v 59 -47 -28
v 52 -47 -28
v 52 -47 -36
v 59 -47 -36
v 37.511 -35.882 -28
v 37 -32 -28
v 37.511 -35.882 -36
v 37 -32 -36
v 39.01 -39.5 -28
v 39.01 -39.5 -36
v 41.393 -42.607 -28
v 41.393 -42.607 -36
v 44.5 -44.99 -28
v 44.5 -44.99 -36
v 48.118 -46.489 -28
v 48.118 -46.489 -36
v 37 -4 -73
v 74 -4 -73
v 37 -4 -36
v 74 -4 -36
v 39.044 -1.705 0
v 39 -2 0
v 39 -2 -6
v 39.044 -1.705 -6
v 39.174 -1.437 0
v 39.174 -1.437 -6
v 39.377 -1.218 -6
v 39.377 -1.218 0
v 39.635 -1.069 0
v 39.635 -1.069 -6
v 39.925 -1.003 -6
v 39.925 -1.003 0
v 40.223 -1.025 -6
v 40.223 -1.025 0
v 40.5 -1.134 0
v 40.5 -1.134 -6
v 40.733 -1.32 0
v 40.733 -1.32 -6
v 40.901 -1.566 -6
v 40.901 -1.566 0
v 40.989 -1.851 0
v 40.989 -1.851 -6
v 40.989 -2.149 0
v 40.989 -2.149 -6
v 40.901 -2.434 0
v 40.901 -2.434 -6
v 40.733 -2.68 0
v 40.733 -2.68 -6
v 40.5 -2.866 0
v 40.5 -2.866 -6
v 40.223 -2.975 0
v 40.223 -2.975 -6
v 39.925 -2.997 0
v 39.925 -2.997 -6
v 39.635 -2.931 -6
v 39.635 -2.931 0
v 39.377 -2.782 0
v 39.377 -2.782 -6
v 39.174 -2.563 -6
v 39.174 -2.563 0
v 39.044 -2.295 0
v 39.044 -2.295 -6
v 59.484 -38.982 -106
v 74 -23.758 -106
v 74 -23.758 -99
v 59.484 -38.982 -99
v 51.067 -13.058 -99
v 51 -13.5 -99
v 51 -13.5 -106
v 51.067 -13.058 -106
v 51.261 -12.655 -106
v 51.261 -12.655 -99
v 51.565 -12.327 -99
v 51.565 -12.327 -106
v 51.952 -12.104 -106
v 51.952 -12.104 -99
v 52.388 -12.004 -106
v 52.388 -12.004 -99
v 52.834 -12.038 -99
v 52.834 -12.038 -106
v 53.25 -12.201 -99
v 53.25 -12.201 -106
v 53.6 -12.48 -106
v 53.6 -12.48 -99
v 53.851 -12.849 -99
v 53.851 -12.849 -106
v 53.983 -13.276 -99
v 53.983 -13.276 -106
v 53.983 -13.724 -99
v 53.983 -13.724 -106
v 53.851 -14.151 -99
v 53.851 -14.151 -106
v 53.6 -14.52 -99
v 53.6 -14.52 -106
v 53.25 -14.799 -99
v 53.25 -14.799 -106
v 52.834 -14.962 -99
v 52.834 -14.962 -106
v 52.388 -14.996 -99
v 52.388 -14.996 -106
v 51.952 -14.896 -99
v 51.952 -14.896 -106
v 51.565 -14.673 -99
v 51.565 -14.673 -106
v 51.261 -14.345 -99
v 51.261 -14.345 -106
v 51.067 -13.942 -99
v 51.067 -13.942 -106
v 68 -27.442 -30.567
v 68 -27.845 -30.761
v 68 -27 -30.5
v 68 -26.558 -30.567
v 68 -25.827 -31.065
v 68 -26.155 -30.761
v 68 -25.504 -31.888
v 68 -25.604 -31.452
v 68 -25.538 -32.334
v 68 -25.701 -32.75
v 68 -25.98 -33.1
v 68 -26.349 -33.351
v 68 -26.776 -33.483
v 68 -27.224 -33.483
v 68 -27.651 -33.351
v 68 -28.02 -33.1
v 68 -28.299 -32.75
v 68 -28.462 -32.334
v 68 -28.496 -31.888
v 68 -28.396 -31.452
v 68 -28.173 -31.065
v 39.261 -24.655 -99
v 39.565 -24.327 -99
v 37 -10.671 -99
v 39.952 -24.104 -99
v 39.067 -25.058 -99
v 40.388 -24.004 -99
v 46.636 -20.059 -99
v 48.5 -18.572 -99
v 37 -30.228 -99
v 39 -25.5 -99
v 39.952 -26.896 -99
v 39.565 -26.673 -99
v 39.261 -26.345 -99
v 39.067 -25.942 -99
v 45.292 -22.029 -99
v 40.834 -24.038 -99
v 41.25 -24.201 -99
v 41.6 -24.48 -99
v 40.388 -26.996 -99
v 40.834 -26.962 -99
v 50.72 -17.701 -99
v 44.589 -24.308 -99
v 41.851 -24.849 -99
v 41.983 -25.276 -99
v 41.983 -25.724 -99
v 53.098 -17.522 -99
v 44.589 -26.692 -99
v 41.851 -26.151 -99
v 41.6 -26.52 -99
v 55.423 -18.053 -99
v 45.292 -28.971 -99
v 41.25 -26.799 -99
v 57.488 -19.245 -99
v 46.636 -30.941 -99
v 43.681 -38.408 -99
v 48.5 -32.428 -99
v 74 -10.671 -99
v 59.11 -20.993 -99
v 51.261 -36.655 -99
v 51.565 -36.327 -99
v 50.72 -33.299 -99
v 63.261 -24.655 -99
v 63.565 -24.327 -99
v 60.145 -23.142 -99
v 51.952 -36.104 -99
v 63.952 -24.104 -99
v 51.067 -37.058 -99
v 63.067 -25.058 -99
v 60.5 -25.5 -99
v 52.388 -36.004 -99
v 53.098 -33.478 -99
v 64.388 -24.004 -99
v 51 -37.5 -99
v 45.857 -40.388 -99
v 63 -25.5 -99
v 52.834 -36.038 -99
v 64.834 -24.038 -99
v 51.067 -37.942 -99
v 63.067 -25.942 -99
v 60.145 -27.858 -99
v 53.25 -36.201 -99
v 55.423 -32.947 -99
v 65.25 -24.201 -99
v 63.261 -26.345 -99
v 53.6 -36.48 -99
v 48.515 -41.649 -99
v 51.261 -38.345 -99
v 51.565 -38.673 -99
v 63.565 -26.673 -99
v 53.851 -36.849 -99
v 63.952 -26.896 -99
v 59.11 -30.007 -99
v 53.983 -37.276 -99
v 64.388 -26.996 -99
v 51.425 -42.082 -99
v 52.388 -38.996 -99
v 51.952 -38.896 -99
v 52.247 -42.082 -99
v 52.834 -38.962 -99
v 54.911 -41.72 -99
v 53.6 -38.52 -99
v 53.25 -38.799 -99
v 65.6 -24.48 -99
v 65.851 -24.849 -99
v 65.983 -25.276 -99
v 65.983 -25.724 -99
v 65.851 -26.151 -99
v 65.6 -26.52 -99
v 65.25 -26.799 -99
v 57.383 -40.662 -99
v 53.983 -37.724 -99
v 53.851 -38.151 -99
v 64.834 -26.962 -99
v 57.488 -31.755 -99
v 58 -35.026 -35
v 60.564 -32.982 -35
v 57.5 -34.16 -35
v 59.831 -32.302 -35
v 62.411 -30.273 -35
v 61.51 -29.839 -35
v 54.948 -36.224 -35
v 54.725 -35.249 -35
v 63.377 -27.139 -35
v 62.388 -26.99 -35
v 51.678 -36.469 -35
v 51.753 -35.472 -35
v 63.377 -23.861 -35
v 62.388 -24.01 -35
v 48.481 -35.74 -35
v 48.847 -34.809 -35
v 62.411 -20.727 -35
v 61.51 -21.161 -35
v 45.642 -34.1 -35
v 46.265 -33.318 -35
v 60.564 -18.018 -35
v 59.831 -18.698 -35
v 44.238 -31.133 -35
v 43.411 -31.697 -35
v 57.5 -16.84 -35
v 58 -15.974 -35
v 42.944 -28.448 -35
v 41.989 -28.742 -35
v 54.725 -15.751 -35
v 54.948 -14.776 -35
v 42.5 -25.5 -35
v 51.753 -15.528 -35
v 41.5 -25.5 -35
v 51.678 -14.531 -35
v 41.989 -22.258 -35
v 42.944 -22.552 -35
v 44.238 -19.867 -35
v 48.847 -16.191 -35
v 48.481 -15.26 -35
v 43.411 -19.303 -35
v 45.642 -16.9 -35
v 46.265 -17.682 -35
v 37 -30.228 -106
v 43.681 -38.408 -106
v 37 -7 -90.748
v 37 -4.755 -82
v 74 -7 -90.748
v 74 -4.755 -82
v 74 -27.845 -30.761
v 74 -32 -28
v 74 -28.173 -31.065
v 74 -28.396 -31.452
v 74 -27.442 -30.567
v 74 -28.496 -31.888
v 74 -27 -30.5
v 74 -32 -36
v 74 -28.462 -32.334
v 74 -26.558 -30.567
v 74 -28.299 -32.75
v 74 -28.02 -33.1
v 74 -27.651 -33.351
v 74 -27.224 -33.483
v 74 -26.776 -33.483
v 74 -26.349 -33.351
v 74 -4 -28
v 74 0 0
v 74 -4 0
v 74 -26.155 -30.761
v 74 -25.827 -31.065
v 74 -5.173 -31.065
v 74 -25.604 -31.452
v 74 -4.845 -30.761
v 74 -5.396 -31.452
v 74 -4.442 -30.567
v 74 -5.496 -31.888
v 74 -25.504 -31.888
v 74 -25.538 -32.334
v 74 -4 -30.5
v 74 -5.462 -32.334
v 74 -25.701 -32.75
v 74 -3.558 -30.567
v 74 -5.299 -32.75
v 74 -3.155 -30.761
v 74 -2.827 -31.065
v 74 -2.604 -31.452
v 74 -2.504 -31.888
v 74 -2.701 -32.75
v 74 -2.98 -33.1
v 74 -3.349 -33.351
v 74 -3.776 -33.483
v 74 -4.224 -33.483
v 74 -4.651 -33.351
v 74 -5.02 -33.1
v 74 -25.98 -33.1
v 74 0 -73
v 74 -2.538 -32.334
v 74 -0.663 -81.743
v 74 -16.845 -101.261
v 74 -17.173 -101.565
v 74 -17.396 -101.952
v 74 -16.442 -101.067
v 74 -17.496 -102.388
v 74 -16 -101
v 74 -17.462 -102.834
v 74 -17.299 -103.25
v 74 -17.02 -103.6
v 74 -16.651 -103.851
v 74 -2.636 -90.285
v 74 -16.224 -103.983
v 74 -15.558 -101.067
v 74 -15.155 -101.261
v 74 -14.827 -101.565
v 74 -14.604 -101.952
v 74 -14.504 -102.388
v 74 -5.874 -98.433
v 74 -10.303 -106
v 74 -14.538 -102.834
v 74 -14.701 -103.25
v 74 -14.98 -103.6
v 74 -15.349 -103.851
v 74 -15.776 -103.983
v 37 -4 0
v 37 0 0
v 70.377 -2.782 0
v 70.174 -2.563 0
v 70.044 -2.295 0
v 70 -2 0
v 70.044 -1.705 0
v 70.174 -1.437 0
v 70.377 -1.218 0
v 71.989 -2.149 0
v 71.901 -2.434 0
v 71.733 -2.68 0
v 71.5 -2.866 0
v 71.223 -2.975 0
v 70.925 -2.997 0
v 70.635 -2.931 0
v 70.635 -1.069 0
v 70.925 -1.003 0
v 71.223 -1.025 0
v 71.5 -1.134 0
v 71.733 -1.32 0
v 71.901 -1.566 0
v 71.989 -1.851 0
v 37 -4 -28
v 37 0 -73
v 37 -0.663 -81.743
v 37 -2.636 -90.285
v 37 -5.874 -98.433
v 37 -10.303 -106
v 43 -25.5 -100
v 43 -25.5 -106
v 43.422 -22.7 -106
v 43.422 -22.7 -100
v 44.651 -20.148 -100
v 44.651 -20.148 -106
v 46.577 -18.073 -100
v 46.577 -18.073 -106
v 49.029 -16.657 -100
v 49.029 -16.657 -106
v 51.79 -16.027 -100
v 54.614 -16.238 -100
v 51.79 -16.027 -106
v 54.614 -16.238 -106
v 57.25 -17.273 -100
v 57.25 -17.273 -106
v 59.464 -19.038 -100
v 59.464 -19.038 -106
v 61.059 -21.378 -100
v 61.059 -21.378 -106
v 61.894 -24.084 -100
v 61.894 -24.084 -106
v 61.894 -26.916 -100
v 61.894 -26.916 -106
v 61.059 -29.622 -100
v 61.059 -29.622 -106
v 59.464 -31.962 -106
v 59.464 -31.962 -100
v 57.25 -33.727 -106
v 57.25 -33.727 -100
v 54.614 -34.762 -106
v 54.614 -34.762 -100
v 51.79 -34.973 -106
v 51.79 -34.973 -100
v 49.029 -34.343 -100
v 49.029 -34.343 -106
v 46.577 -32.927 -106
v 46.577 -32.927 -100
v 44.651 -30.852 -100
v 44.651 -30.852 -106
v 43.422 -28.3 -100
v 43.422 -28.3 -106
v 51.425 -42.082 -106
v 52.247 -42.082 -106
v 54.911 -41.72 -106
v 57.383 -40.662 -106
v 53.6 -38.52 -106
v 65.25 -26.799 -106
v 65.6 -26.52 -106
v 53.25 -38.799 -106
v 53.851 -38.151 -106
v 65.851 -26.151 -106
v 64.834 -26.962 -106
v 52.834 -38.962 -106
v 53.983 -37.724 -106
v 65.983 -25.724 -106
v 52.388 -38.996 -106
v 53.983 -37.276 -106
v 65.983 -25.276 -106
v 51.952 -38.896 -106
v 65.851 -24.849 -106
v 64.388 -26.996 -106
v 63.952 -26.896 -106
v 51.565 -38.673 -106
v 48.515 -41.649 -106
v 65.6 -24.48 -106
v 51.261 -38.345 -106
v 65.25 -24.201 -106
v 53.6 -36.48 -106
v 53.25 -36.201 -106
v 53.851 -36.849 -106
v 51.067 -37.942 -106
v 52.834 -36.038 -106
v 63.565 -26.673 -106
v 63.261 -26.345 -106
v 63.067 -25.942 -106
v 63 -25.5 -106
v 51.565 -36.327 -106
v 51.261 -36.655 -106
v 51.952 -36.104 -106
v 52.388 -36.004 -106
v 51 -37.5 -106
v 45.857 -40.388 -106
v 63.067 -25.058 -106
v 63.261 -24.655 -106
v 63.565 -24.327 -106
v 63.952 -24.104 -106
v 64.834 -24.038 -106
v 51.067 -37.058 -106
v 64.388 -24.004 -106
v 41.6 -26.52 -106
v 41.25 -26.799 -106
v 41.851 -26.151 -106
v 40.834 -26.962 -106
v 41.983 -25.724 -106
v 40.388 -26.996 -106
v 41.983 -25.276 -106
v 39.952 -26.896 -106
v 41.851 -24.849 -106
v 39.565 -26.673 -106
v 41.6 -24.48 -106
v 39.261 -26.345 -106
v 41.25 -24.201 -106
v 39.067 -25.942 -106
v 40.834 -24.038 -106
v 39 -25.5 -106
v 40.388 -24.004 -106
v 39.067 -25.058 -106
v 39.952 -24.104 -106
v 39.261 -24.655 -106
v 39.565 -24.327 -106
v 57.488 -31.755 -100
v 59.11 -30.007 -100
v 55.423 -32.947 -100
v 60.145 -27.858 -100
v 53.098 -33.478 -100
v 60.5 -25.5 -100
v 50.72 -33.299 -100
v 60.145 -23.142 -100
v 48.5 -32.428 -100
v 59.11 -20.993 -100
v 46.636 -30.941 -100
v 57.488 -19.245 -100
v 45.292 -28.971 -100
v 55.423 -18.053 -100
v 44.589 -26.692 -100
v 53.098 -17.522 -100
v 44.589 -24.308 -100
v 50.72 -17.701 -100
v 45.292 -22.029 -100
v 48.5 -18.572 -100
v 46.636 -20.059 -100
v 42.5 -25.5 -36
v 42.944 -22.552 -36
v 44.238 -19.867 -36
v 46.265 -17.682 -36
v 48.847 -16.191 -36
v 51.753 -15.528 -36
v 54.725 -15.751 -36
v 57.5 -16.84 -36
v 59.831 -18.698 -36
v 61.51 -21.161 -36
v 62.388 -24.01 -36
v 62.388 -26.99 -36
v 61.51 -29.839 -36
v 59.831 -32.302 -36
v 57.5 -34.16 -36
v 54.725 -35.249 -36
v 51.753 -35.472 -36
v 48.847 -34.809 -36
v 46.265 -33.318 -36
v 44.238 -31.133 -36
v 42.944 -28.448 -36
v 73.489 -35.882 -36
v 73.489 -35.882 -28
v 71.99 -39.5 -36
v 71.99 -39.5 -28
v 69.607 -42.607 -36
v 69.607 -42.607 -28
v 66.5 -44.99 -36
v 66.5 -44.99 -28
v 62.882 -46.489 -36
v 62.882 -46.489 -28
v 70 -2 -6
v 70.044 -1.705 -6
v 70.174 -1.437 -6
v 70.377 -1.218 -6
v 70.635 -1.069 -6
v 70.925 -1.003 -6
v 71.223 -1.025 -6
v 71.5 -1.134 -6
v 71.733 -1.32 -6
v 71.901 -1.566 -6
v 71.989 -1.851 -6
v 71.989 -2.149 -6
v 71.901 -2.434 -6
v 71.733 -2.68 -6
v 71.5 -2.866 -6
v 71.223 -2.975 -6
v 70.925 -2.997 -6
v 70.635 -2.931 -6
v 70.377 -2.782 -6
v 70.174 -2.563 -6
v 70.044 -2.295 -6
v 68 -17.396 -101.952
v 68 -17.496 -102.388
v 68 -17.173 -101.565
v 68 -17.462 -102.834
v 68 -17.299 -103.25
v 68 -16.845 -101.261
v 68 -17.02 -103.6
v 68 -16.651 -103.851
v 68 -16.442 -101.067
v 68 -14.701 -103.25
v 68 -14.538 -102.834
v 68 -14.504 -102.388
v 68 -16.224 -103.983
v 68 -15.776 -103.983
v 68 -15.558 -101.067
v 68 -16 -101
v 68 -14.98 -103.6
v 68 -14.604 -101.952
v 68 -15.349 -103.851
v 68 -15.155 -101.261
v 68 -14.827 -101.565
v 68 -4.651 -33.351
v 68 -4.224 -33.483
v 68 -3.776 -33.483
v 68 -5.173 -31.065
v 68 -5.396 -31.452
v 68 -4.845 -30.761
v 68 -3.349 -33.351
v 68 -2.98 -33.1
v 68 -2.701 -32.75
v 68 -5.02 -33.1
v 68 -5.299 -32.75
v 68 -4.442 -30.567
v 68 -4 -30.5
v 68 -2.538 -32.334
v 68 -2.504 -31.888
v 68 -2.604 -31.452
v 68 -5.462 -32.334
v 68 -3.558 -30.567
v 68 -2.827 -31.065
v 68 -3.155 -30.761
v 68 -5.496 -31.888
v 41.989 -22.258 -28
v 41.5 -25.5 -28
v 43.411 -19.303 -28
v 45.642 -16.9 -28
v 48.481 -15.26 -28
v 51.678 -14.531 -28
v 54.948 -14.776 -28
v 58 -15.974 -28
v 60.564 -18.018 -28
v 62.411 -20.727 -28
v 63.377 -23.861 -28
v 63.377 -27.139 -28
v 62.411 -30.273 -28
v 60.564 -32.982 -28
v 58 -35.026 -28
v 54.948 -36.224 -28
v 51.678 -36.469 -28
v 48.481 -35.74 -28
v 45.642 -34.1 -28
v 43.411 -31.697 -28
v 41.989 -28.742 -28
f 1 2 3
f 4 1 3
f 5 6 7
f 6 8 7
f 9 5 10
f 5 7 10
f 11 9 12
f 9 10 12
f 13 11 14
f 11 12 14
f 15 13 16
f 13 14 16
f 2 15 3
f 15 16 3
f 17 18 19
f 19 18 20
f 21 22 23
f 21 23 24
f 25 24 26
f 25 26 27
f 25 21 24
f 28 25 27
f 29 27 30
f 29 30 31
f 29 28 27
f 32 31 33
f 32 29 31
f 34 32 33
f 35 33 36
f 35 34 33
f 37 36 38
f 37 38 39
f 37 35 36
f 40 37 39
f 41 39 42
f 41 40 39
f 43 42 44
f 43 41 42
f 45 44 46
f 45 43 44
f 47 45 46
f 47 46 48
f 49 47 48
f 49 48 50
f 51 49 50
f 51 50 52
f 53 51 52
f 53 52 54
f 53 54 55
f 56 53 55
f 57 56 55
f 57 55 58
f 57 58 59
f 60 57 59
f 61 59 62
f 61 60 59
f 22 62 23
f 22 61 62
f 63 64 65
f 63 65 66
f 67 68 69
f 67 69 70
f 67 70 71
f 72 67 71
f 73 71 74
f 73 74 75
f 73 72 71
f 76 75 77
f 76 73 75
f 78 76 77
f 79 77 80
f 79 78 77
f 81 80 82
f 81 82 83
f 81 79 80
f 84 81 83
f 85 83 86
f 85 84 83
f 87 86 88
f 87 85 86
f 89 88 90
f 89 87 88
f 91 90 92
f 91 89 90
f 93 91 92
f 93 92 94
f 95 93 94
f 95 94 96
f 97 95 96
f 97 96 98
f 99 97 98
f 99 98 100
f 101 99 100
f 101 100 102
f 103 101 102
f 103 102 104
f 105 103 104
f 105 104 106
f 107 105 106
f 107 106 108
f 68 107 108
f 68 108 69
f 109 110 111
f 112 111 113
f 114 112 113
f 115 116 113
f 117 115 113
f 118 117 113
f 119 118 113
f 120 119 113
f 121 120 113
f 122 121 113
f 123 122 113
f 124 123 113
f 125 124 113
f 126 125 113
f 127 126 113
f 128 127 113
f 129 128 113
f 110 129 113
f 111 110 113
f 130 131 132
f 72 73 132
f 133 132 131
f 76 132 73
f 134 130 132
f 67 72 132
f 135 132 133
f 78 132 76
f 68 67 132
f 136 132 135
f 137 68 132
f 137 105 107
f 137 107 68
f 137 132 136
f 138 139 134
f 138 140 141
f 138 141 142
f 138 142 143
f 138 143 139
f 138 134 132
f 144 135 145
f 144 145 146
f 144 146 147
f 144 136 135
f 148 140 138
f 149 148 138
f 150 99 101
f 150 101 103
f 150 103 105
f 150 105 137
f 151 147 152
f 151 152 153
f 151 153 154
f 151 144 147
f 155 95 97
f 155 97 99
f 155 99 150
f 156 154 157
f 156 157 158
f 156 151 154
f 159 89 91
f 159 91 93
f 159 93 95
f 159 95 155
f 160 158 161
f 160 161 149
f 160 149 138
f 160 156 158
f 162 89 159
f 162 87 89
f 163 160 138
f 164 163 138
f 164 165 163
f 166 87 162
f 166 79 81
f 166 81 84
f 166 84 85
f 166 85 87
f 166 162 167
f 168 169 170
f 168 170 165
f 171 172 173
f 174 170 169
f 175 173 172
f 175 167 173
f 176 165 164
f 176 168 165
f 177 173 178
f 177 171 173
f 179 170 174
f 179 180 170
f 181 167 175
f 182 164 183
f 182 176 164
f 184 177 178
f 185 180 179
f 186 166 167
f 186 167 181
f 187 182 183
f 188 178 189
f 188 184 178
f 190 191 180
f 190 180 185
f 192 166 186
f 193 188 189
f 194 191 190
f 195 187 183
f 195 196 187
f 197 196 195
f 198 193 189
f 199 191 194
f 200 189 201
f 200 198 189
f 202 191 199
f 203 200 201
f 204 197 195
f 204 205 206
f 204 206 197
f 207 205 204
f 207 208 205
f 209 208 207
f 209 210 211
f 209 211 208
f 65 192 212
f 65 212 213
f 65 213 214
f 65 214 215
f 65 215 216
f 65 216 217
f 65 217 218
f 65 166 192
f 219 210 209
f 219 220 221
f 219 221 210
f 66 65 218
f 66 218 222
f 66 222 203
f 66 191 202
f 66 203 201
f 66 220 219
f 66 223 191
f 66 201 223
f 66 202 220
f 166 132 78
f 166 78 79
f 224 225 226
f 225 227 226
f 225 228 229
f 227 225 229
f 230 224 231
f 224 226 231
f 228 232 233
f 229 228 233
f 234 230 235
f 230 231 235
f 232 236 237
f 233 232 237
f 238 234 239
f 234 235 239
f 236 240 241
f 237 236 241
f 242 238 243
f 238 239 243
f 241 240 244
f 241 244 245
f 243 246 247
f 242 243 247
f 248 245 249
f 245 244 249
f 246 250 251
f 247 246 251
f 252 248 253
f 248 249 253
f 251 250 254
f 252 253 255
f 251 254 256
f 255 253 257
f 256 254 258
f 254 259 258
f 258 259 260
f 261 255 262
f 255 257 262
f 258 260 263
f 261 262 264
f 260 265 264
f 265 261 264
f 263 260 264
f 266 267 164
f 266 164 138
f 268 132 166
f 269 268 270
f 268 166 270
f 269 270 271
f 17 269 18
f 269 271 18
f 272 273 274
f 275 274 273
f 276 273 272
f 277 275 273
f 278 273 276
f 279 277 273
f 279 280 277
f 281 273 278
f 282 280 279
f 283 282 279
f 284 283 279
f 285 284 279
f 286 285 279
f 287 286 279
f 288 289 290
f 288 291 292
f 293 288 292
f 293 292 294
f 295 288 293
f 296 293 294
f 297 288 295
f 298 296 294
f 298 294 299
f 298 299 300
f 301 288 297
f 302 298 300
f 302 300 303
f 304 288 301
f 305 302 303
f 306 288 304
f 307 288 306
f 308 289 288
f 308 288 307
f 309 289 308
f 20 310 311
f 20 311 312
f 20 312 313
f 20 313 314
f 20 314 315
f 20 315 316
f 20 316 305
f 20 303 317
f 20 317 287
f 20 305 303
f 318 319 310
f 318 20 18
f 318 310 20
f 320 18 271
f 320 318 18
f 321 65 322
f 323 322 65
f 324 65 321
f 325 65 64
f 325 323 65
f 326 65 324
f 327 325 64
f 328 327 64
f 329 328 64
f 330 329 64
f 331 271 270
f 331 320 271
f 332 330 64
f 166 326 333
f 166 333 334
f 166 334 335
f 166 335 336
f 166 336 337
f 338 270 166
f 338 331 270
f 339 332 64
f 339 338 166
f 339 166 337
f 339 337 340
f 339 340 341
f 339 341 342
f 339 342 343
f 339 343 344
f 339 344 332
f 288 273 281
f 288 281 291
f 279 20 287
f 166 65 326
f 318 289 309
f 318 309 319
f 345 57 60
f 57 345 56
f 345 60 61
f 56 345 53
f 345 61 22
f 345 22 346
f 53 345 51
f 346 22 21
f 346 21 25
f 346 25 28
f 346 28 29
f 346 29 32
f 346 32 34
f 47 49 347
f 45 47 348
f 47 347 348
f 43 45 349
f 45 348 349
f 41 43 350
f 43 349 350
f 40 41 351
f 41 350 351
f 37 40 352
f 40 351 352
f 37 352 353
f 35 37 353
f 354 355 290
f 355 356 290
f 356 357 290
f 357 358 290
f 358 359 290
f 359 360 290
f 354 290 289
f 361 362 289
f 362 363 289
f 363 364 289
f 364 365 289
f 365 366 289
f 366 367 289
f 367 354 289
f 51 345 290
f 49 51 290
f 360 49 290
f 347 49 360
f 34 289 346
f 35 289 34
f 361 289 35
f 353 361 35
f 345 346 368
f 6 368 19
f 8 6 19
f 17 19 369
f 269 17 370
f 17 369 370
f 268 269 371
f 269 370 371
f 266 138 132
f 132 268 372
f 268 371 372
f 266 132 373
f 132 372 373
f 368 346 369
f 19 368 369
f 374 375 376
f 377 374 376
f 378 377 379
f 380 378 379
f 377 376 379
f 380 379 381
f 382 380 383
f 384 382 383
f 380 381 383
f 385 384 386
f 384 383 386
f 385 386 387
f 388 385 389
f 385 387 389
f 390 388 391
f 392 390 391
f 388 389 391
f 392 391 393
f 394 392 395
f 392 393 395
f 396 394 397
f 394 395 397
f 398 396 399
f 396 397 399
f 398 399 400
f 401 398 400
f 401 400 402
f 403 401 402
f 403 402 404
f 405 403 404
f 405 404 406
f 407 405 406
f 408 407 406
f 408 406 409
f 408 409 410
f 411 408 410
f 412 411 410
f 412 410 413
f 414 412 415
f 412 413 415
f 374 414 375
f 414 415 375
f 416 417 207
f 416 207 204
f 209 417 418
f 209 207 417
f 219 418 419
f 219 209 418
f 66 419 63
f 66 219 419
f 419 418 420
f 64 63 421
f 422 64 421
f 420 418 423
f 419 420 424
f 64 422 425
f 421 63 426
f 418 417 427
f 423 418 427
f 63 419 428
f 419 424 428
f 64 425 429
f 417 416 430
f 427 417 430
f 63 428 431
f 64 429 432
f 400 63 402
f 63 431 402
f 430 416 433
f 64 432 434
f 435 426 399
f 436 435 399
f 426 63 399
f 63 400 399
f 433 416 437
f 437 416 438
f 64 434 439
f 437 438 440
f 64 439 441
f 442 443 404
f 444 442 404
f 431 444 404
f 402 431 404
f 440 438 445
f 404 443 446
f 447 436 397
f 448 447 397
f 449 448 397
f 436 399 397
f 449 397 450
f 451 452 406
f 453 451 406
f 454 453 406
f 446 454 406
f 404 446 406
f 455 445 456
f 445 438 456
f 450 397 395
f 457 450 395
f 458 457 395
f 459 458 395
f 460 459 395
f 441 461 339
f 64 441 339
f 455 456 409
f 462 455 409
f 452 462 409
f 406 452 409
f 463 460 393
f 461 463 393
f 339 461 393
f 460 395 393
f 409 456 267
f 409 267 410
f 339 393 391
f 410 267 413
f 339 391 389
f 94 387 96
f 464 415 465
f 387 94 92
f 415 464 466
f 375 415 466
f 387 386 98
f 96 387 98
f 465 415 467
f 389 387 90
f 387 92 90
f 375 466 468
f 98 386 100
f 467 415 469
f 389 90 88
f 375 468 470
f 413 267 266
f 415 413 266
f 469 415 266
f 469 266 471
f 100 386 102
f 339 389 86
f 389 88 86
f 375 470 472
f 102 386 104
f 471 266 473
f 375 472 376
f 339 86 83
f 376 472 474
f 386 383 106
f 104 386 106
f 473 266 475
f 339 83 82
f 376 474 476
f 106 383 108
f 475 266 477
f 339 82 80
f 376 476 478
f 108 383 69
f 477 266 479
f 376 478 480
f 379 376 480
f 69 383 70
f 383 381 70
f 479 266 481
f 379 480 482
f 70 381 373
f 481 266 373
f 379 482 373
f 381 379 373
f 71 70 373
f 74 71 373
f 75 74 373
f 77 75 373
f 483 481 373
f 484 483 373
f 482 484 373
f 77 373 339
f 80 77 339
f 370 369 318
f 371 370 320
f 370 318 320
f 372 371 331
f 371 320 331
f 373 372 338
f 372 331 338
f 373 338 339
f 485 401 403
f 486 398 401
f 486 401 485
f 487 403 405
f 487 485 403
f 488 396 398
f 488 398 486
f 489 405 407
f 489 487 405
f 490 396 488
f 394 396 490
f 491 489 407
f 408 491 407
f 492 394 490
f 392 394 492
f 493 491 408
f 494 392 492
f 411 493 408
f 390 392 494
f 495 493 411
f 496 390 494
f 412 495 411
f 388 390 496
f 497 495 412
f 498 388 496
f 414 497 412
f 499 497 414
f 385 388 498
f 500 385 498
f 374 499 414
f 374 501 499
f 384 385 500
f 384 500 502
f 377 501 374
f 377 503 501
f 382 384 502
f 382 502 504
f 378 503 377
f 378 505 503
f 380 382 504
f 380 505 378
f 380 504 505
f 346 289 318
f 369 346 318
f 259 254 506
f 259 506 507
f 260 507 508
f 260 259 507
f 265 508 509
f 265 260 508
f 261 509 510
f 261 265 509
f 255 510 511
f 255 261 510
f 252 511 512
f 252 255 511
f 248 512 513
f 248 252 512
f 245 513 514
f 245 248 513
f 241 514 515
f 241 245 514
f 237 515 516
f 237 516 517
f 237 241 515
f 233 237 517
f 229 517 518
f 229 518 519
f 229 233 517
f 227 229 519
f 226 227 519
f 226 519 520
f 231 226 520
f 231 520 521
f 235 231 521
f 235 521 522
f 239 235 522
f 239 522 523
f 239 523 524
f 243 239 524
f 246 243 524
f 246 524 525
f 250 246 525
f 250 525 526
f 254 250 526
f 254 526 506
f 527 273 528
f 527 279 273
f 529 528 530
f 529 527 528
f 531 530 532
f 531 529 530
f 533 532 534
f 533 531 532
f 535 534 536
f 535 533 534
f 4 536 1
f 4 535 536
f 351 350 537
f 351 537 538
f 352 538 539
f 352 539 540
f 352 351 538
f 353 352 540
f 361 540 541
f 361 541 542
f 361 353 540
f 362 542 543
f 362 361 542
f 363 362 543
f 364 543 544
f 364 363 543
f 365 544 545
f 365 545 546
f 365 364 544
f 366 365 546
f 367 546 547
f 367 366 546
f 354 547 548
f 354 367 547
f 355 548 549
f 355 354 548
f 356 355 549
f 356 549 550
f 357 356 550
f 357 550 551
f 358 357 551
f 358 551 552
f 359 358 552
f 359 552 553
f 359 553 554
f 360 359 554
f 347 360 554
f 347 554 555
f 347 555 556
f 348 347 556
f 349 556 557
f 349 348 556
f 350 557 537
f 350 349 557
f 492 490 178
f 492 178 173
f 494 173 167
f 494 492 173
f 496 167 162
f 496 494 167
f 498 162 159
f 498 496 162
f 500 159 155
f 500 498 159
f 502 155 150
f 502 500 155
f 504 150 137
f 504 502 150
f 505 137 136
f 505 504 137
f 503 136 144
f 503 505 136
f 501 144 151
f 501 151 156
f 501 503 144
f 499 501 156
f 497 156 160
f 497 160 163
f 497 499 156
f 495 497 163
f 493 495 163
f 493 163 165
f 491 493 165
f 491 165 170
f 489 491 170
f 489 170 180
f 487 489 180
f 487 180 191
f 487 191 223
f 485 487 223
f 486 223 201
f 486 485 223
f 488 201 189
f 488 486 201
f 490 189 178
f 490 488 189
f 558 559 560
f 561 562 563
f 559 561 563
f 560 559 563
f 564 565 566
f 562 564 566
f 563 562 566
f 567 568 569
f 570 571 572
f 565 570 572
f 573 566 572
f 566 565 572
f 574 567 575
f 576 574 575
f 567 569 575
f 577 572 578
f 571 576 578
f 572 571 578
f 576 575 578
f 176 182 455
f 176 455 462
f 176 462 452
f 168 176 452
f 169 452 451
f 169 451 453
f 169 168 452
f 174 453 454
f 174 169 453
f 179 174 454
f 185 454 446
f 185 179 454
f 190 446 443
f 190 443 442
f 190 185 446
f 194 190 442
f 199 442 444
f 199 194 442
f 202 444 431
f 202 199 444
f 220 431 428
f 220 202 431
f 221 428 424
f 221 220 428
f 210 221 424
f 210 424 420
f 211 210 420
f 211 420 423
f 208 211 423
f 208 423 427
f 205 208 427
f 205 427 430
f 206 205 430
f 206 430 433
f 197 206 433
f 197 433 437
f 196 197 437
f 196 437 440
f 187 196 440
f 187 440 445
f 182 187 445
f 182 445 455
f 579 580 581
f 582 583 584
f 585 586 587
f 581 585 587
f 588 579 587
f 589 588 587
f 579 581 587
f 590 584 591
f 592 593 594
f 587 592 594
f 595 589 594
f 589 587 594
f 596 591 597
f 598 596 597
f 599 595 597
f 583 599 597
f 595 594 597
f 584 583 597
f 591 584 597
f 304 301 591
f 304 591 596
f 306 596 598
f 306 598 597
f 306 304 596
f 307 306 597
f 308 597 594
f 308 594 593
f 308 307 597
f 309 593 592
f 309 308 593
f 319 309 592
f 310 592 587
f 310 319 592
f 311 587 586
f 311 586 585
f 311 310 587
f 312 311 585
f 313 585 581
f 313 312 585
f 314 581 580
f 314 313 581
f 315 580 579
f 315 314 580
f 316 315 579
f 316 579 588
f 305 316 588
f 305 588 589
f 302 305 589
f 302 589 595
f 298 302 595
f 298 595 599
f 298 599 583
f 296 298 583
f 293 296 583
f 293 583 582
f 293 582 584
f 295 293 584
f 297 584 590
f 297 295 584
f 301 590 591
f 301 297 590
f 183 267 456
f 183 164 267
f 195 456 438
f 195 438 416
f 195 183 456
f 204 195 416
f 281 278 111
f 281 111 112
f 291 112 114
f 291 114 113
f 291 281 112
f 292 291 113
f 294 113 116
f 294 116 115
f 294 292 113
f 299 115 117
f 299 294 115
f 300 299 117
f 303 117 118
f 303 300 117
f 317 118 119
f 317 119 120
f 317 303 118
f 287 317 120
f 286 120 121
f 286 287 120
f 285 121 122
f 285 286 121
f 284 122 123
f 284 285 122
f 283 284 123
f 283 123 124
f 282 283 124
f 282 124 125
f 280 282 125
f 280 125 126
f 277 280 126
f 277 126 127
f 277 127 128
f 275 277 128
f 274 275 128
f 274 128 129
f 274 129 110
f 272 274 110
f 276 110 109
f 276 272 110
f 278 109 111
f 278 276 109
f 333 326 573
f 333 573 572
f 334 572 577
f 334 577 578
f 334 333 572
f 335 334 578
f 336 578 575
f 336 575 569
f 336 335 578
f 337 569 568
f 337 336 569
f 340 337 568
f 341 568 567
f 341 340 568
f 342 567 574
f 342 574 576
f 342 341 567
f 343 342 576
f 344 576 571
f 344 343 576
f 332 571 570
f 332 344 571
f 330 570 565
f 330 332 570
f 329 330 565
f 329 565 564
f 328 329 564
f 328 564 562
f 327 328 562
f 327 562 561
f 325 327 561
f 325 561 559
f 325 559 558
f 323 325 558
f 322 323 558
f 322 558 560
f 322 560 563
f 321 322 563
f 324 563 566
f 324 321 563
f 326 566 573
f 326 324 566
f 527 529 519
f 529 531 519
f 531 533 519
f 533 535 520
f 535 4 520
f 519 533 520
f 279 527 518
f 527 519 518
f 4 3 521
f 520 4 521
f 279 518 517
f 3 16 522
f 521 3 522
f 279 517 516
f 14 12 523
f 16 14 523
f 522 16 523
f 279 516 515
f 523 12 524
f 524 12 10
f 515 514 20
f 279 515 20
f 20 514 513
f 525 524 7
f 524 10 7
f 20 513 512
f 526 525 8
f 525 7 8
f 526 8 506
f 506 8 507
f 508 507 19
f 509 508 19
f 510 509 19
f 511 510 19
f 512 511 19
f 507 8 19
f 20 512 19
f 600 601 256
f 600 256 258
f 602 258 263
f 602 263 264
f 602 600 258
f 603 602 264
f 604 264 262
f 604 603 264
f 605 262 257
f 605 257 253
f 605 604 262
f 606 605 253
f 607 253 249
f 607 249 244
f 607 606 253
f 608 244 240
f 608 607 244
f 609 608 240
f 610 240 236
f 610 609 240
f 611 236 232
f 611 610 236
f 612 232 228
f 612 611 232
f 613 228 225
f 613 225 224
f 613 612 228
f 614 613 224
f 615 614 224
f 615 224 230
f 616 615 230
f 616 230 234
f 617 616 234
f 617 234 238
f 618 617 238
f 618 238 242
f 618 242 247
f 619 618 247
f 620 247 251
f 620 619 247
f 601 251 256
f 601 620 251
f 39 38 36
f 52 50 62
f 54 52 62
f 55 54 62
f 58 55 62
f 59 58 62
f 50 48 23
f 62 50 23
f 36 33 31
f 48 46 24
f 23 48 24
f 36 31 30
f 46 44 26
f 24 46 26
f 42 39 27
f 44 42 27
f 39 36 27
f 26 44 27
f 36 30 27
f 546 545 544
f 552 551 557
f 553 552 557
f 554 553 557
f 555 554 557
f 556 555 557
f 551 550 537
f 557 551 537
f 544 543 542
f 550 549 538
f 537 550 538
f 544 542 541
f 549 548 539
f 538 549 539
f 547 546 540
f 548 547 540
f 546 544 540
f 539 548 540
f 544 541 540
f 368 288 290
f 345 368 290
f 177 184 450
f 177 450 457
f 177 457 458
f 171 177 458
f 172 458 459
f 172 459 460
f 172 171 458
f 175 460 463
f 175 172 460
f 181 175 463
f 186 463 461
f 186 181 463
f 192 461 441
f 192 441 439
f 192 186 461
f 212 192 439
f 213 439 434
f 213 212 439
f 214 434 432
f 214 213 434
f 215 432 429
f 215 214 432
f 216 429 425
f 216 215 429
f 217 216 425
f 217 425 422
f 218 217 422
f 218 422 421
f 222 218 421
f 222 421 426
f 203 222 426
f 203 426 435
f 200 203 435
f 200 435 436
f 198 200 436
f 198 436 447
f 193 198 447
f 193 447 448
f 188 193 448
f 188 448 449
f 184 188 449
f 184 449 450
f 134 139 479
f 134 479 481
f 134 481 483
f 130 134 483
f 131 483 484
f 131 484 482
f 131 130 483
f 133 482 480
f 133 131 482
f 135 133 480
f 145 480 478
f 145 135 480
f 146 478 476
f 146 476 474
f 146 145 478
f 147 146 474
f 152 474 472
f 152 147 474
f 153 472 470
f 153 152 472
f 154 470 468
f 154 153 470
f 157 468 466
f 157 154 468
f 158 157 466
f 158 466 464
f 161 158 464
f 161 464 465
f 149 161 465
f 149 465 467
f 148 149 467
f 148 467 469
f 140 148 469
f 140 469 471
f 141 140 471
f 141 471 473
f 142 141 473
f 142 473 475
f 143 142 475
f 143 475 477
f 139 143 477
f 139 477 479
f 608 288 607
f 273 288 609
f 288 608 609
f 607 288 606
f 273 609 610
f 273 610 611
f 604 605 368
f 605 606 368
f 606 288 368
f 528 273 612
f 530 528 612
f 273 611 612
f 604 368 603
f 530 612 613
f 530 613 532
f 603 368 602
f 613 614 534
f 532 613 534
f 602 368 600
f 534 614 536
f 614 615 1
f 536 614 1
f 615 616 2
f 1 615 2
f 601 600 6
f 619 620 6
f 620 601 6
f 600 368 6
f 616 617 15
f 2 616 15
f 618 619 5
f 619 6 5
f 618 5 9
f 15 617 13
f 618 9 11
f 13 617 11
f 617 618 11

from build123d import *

# Parameters (mm, degrees)
BOSS_EXTRUDE1_DEPTH = 37
BOSS_EXTRUDE3_DEPTH = 37
SKETCH5_R           = 11
CUT_EXTRUDE1_DEPTH  = 7
SKETCH6_R           = 10
CUT_EXTRUDE2_DEPTH  = 7
BOSS_EXTRUDE4_START = -37
BOSS_EXTRUDE4_DEPTH = 37
SKETCH8_R           = 9.5
CUT_EXTRUDE3_DEPTH  = 6
SKETCH9_R           = 8
CUT_EXTRUDE4_DEPTH  = 1
CUT_EXTRUDE5_DEPTH  = 7
CUT_EXTRUDE6_DEPTH  = 131.044047905
FILLET2_R           = 10
SKETCH12_R          = 1.5
CUT_EXTRUDE7_DEPTH  = 116.667627277
FILLET5_R           = 15
SKETCH20_R          = 1.5
CUT_EXTRUDE14_DEPTH = 6
SKETCH21_R          = 1
CUT_EXTRUDE15_DEPTH = 6


with BuildPart() as part:
    # Sketch3 → Boss-Extrude1 (new body)
    with BuildSketch(Plane(origin=(0, 0, 0), x_dir=(0, 0, -1), z_dir=(1, 0, 0))):
        with BuildLine():
            Line((0, 0), (73, 0))
            ThreePointArc((73, 0), (96.162469644, -4.825758115), (115.470578051, -18.5))
            Line((115.470578051, -18.5), (109.820510589, -18.5))
            ThreePointArc((109.820510589, -18.5), (107.466378544, -16.429953692), (104.996093512, -14.5))
            ThreePointArc((104.996093512, -14.5), (89.83745824, -6.692105871), (73, -4))
            Line((73, -4), (0, -4))
            Line((0, -4), (0, 0))
        make_face()
    extrude(amount=BOSS_EXTRUDE1_DEPTH)

    # Sketch4 → Boss-Extrude3 (add)
    with BuildSketch(Plane(origin=(37, 0, 0), x_dir=(0, 0, -1), z_dir=(1, 0, 0))):
        Polygon((28, -4), (28, -14.5), (28, -36.5), (28, -47), (36, -47), (36, -35.5), (36, -15.5), (36, -4), align=None)
    extrude(amount=-BOSS_EXTRUDE3_DEPTH)

    # Sketch5 → Cut-Extrude1 (cut)
    with BuildSketch(Plane.XY.offset(-28)):
        with Locations((21.5, -25.5)):
            Circle(SKETCH5_R)
    extrude(amount=-CUT_EXTRUDE1_DEPTH, mode=Mode.SUBTRACT)

    # Sketch6 → Cut-Extrude2 (cut)
    with BuildSketch(Plane.XY.offset(-35)):
        with Locations((21.5, -25.5)):
            Circle(SKETCH6_R)
    extrude(amount=-CUT_EXTRUDE2_DEPTH, mode=Mode.SUBTRACT)

    # Sketch7 → Boss-Extrude4 (add)
    with BuildSketch(Plane(origin=(37, 0, 0), x_dir=(0, 0, -1), z_dir=(1, 0, 0)).offset(BOSS_EXTRUDE4_START)):
        with BuildLine():
            Line((99, -10.671361735), (99, -47))
            Line((99, -47), (106, -47))
            Line((106, -47), (106, -15.256579454))
            ThreePointArc((106, -15.256579454), (102.588951576, -12.82817311), (99, -10.671361735))
        make_face()
    extrude(amount=BOSS_EXTRUDE4_DEPTH)

    # Sketch8 → Cut-Extrude3 (cut)
    with BuildSketch(Plane.XY.offset(-106)):
        with Locations((21.5, -25.5)):
            Circle(SKETCH8_R)
    extrude(amount=CUT_EXTRUDE3_DEPTH, mode=Mode.SUBTRACT)

    # Sketch9 → Cut-Extrude4 (cut)
    with BuildSketch(Plane(origin=(0, 0, -100), x_dir=(-1, 0, 0), z_dir=(0, 0, -1))):
        with Locations((-21.5, -25.5)):
            Circle(SKETCH9_R)
    extrude(amount=-CUT_EXTRUDE4_DEPTH, mode=Mode.SUBTRACT)

    # Sketch10 → Cut-Extrude5 (cut)
    with BuildSketch(Plane(origin=(0, 0, -106), x_dir=(-1, 0, 0), z_dir=(0, 0, -1))):
        Polygon((0, -23.757683827), (-17.471056315, -42.081867062), (-27.318513182, -42.081867062), (-37, -30.228411032), (-37, -47), (0, -47), align=None)
    extrude(amount=-CUT_EXTRUDE5_DEPTH, mode=Mode.SUBTRACT)

    # Sketch11 → Cut-Extrude6 (cut, through all)
    with BuildSketch(Plane(origin=(37, 0, 0), x_dir=(0, 0, -1), z_dir=(1, 0, 0))):
        with BuildLine():
            Line((106, -15.256579454), (106, -10.303039929))
            ThreePointArc((106, -10.303039929), (110.957207174, -14.145120869), (115.470578051, -18.5))
            Line((115.470578051, -18.5), (109.820510589, -18.5))
            ThreePointArc((109.820510589, -18.5), (107.947902211, -16.833944431), (106, -15.256579454))
        make_face()
    extrude(amount=-CUT_EXTRUDE6_DEPTH, mode=Mode.SUBTRACT)

    # Fillet2
    fillet2_edges = [part.edges().sort_by_distance(p)[0] for p in [
        (17.471056315, -42.081867062, -102.5),
        (27.318513182, -42.081867062, -102.5),
    ]]
    fillet(fillet2_edges, radius=FILLET2_R)

    # Sketch12 → Cut-Extrude7 (cut, through all)
    with BuildSketch(Plane.XY.offset(-99)):
        with Locations((21.5, -13.5)):
            Circle(SKETCH12_R)
        with Locations((33.5, -25.5)):
            Circle(SKETCH12_R)
        with Locations((21.5, -37.5)):
            Circle(SKETCH12_R)
        with Locations((9.5, -25.5)):
            Circle(SKETCH12_R)
    extrude(amount=-CUT_EXTRUDE7_DEPTH, mode=Mode.SUBTRACT)

    # Fillet5
    fillet5_edges = [part.edges().sort_by_distance(p)[0] for p in [
        (0, -47, -32),
        (37, -47, -32),
    ]]
    fillet(fillet5_edges, radius=FILLET5_R)

    # Sketch20 → Cut-Extrude14 (cut)
    with BuildSketch(Plane.ZY):
        with Locations((-32, -4)):
            Circle(SKETCH20_R)
        with Locations((-102.5, -16)):
            Circle(SKETCH20_R)
        with Locations((-32, -27)):
            Circle(SKETCH20_R)
    extrude(amount=-CUT_EXTRUDE14_DEPTH, mode=Mode.SUBTRACT)

    # Sketch21 → Cut-Extrude15 (cut)
    with BuildSketch(Plane.XY):
        with Locations((3, -2)):
            Circle(SKETCH21_R)
        with Locations((34, -2)):
            Circle(SKETCH21_R)
    extrude(amount=-CUT_EXTRUDE15_DEPTH, mode=Mode.SUBTRACT)


with BuildPart() as body_2:
    # Mirror1: mirrored copy
    add(part.part.mirror(Plane(origin=(37, -58, -73), x_dir=(0, 0, 1), z_dir=(-1, 0, 0))))


solid = body_2.part
